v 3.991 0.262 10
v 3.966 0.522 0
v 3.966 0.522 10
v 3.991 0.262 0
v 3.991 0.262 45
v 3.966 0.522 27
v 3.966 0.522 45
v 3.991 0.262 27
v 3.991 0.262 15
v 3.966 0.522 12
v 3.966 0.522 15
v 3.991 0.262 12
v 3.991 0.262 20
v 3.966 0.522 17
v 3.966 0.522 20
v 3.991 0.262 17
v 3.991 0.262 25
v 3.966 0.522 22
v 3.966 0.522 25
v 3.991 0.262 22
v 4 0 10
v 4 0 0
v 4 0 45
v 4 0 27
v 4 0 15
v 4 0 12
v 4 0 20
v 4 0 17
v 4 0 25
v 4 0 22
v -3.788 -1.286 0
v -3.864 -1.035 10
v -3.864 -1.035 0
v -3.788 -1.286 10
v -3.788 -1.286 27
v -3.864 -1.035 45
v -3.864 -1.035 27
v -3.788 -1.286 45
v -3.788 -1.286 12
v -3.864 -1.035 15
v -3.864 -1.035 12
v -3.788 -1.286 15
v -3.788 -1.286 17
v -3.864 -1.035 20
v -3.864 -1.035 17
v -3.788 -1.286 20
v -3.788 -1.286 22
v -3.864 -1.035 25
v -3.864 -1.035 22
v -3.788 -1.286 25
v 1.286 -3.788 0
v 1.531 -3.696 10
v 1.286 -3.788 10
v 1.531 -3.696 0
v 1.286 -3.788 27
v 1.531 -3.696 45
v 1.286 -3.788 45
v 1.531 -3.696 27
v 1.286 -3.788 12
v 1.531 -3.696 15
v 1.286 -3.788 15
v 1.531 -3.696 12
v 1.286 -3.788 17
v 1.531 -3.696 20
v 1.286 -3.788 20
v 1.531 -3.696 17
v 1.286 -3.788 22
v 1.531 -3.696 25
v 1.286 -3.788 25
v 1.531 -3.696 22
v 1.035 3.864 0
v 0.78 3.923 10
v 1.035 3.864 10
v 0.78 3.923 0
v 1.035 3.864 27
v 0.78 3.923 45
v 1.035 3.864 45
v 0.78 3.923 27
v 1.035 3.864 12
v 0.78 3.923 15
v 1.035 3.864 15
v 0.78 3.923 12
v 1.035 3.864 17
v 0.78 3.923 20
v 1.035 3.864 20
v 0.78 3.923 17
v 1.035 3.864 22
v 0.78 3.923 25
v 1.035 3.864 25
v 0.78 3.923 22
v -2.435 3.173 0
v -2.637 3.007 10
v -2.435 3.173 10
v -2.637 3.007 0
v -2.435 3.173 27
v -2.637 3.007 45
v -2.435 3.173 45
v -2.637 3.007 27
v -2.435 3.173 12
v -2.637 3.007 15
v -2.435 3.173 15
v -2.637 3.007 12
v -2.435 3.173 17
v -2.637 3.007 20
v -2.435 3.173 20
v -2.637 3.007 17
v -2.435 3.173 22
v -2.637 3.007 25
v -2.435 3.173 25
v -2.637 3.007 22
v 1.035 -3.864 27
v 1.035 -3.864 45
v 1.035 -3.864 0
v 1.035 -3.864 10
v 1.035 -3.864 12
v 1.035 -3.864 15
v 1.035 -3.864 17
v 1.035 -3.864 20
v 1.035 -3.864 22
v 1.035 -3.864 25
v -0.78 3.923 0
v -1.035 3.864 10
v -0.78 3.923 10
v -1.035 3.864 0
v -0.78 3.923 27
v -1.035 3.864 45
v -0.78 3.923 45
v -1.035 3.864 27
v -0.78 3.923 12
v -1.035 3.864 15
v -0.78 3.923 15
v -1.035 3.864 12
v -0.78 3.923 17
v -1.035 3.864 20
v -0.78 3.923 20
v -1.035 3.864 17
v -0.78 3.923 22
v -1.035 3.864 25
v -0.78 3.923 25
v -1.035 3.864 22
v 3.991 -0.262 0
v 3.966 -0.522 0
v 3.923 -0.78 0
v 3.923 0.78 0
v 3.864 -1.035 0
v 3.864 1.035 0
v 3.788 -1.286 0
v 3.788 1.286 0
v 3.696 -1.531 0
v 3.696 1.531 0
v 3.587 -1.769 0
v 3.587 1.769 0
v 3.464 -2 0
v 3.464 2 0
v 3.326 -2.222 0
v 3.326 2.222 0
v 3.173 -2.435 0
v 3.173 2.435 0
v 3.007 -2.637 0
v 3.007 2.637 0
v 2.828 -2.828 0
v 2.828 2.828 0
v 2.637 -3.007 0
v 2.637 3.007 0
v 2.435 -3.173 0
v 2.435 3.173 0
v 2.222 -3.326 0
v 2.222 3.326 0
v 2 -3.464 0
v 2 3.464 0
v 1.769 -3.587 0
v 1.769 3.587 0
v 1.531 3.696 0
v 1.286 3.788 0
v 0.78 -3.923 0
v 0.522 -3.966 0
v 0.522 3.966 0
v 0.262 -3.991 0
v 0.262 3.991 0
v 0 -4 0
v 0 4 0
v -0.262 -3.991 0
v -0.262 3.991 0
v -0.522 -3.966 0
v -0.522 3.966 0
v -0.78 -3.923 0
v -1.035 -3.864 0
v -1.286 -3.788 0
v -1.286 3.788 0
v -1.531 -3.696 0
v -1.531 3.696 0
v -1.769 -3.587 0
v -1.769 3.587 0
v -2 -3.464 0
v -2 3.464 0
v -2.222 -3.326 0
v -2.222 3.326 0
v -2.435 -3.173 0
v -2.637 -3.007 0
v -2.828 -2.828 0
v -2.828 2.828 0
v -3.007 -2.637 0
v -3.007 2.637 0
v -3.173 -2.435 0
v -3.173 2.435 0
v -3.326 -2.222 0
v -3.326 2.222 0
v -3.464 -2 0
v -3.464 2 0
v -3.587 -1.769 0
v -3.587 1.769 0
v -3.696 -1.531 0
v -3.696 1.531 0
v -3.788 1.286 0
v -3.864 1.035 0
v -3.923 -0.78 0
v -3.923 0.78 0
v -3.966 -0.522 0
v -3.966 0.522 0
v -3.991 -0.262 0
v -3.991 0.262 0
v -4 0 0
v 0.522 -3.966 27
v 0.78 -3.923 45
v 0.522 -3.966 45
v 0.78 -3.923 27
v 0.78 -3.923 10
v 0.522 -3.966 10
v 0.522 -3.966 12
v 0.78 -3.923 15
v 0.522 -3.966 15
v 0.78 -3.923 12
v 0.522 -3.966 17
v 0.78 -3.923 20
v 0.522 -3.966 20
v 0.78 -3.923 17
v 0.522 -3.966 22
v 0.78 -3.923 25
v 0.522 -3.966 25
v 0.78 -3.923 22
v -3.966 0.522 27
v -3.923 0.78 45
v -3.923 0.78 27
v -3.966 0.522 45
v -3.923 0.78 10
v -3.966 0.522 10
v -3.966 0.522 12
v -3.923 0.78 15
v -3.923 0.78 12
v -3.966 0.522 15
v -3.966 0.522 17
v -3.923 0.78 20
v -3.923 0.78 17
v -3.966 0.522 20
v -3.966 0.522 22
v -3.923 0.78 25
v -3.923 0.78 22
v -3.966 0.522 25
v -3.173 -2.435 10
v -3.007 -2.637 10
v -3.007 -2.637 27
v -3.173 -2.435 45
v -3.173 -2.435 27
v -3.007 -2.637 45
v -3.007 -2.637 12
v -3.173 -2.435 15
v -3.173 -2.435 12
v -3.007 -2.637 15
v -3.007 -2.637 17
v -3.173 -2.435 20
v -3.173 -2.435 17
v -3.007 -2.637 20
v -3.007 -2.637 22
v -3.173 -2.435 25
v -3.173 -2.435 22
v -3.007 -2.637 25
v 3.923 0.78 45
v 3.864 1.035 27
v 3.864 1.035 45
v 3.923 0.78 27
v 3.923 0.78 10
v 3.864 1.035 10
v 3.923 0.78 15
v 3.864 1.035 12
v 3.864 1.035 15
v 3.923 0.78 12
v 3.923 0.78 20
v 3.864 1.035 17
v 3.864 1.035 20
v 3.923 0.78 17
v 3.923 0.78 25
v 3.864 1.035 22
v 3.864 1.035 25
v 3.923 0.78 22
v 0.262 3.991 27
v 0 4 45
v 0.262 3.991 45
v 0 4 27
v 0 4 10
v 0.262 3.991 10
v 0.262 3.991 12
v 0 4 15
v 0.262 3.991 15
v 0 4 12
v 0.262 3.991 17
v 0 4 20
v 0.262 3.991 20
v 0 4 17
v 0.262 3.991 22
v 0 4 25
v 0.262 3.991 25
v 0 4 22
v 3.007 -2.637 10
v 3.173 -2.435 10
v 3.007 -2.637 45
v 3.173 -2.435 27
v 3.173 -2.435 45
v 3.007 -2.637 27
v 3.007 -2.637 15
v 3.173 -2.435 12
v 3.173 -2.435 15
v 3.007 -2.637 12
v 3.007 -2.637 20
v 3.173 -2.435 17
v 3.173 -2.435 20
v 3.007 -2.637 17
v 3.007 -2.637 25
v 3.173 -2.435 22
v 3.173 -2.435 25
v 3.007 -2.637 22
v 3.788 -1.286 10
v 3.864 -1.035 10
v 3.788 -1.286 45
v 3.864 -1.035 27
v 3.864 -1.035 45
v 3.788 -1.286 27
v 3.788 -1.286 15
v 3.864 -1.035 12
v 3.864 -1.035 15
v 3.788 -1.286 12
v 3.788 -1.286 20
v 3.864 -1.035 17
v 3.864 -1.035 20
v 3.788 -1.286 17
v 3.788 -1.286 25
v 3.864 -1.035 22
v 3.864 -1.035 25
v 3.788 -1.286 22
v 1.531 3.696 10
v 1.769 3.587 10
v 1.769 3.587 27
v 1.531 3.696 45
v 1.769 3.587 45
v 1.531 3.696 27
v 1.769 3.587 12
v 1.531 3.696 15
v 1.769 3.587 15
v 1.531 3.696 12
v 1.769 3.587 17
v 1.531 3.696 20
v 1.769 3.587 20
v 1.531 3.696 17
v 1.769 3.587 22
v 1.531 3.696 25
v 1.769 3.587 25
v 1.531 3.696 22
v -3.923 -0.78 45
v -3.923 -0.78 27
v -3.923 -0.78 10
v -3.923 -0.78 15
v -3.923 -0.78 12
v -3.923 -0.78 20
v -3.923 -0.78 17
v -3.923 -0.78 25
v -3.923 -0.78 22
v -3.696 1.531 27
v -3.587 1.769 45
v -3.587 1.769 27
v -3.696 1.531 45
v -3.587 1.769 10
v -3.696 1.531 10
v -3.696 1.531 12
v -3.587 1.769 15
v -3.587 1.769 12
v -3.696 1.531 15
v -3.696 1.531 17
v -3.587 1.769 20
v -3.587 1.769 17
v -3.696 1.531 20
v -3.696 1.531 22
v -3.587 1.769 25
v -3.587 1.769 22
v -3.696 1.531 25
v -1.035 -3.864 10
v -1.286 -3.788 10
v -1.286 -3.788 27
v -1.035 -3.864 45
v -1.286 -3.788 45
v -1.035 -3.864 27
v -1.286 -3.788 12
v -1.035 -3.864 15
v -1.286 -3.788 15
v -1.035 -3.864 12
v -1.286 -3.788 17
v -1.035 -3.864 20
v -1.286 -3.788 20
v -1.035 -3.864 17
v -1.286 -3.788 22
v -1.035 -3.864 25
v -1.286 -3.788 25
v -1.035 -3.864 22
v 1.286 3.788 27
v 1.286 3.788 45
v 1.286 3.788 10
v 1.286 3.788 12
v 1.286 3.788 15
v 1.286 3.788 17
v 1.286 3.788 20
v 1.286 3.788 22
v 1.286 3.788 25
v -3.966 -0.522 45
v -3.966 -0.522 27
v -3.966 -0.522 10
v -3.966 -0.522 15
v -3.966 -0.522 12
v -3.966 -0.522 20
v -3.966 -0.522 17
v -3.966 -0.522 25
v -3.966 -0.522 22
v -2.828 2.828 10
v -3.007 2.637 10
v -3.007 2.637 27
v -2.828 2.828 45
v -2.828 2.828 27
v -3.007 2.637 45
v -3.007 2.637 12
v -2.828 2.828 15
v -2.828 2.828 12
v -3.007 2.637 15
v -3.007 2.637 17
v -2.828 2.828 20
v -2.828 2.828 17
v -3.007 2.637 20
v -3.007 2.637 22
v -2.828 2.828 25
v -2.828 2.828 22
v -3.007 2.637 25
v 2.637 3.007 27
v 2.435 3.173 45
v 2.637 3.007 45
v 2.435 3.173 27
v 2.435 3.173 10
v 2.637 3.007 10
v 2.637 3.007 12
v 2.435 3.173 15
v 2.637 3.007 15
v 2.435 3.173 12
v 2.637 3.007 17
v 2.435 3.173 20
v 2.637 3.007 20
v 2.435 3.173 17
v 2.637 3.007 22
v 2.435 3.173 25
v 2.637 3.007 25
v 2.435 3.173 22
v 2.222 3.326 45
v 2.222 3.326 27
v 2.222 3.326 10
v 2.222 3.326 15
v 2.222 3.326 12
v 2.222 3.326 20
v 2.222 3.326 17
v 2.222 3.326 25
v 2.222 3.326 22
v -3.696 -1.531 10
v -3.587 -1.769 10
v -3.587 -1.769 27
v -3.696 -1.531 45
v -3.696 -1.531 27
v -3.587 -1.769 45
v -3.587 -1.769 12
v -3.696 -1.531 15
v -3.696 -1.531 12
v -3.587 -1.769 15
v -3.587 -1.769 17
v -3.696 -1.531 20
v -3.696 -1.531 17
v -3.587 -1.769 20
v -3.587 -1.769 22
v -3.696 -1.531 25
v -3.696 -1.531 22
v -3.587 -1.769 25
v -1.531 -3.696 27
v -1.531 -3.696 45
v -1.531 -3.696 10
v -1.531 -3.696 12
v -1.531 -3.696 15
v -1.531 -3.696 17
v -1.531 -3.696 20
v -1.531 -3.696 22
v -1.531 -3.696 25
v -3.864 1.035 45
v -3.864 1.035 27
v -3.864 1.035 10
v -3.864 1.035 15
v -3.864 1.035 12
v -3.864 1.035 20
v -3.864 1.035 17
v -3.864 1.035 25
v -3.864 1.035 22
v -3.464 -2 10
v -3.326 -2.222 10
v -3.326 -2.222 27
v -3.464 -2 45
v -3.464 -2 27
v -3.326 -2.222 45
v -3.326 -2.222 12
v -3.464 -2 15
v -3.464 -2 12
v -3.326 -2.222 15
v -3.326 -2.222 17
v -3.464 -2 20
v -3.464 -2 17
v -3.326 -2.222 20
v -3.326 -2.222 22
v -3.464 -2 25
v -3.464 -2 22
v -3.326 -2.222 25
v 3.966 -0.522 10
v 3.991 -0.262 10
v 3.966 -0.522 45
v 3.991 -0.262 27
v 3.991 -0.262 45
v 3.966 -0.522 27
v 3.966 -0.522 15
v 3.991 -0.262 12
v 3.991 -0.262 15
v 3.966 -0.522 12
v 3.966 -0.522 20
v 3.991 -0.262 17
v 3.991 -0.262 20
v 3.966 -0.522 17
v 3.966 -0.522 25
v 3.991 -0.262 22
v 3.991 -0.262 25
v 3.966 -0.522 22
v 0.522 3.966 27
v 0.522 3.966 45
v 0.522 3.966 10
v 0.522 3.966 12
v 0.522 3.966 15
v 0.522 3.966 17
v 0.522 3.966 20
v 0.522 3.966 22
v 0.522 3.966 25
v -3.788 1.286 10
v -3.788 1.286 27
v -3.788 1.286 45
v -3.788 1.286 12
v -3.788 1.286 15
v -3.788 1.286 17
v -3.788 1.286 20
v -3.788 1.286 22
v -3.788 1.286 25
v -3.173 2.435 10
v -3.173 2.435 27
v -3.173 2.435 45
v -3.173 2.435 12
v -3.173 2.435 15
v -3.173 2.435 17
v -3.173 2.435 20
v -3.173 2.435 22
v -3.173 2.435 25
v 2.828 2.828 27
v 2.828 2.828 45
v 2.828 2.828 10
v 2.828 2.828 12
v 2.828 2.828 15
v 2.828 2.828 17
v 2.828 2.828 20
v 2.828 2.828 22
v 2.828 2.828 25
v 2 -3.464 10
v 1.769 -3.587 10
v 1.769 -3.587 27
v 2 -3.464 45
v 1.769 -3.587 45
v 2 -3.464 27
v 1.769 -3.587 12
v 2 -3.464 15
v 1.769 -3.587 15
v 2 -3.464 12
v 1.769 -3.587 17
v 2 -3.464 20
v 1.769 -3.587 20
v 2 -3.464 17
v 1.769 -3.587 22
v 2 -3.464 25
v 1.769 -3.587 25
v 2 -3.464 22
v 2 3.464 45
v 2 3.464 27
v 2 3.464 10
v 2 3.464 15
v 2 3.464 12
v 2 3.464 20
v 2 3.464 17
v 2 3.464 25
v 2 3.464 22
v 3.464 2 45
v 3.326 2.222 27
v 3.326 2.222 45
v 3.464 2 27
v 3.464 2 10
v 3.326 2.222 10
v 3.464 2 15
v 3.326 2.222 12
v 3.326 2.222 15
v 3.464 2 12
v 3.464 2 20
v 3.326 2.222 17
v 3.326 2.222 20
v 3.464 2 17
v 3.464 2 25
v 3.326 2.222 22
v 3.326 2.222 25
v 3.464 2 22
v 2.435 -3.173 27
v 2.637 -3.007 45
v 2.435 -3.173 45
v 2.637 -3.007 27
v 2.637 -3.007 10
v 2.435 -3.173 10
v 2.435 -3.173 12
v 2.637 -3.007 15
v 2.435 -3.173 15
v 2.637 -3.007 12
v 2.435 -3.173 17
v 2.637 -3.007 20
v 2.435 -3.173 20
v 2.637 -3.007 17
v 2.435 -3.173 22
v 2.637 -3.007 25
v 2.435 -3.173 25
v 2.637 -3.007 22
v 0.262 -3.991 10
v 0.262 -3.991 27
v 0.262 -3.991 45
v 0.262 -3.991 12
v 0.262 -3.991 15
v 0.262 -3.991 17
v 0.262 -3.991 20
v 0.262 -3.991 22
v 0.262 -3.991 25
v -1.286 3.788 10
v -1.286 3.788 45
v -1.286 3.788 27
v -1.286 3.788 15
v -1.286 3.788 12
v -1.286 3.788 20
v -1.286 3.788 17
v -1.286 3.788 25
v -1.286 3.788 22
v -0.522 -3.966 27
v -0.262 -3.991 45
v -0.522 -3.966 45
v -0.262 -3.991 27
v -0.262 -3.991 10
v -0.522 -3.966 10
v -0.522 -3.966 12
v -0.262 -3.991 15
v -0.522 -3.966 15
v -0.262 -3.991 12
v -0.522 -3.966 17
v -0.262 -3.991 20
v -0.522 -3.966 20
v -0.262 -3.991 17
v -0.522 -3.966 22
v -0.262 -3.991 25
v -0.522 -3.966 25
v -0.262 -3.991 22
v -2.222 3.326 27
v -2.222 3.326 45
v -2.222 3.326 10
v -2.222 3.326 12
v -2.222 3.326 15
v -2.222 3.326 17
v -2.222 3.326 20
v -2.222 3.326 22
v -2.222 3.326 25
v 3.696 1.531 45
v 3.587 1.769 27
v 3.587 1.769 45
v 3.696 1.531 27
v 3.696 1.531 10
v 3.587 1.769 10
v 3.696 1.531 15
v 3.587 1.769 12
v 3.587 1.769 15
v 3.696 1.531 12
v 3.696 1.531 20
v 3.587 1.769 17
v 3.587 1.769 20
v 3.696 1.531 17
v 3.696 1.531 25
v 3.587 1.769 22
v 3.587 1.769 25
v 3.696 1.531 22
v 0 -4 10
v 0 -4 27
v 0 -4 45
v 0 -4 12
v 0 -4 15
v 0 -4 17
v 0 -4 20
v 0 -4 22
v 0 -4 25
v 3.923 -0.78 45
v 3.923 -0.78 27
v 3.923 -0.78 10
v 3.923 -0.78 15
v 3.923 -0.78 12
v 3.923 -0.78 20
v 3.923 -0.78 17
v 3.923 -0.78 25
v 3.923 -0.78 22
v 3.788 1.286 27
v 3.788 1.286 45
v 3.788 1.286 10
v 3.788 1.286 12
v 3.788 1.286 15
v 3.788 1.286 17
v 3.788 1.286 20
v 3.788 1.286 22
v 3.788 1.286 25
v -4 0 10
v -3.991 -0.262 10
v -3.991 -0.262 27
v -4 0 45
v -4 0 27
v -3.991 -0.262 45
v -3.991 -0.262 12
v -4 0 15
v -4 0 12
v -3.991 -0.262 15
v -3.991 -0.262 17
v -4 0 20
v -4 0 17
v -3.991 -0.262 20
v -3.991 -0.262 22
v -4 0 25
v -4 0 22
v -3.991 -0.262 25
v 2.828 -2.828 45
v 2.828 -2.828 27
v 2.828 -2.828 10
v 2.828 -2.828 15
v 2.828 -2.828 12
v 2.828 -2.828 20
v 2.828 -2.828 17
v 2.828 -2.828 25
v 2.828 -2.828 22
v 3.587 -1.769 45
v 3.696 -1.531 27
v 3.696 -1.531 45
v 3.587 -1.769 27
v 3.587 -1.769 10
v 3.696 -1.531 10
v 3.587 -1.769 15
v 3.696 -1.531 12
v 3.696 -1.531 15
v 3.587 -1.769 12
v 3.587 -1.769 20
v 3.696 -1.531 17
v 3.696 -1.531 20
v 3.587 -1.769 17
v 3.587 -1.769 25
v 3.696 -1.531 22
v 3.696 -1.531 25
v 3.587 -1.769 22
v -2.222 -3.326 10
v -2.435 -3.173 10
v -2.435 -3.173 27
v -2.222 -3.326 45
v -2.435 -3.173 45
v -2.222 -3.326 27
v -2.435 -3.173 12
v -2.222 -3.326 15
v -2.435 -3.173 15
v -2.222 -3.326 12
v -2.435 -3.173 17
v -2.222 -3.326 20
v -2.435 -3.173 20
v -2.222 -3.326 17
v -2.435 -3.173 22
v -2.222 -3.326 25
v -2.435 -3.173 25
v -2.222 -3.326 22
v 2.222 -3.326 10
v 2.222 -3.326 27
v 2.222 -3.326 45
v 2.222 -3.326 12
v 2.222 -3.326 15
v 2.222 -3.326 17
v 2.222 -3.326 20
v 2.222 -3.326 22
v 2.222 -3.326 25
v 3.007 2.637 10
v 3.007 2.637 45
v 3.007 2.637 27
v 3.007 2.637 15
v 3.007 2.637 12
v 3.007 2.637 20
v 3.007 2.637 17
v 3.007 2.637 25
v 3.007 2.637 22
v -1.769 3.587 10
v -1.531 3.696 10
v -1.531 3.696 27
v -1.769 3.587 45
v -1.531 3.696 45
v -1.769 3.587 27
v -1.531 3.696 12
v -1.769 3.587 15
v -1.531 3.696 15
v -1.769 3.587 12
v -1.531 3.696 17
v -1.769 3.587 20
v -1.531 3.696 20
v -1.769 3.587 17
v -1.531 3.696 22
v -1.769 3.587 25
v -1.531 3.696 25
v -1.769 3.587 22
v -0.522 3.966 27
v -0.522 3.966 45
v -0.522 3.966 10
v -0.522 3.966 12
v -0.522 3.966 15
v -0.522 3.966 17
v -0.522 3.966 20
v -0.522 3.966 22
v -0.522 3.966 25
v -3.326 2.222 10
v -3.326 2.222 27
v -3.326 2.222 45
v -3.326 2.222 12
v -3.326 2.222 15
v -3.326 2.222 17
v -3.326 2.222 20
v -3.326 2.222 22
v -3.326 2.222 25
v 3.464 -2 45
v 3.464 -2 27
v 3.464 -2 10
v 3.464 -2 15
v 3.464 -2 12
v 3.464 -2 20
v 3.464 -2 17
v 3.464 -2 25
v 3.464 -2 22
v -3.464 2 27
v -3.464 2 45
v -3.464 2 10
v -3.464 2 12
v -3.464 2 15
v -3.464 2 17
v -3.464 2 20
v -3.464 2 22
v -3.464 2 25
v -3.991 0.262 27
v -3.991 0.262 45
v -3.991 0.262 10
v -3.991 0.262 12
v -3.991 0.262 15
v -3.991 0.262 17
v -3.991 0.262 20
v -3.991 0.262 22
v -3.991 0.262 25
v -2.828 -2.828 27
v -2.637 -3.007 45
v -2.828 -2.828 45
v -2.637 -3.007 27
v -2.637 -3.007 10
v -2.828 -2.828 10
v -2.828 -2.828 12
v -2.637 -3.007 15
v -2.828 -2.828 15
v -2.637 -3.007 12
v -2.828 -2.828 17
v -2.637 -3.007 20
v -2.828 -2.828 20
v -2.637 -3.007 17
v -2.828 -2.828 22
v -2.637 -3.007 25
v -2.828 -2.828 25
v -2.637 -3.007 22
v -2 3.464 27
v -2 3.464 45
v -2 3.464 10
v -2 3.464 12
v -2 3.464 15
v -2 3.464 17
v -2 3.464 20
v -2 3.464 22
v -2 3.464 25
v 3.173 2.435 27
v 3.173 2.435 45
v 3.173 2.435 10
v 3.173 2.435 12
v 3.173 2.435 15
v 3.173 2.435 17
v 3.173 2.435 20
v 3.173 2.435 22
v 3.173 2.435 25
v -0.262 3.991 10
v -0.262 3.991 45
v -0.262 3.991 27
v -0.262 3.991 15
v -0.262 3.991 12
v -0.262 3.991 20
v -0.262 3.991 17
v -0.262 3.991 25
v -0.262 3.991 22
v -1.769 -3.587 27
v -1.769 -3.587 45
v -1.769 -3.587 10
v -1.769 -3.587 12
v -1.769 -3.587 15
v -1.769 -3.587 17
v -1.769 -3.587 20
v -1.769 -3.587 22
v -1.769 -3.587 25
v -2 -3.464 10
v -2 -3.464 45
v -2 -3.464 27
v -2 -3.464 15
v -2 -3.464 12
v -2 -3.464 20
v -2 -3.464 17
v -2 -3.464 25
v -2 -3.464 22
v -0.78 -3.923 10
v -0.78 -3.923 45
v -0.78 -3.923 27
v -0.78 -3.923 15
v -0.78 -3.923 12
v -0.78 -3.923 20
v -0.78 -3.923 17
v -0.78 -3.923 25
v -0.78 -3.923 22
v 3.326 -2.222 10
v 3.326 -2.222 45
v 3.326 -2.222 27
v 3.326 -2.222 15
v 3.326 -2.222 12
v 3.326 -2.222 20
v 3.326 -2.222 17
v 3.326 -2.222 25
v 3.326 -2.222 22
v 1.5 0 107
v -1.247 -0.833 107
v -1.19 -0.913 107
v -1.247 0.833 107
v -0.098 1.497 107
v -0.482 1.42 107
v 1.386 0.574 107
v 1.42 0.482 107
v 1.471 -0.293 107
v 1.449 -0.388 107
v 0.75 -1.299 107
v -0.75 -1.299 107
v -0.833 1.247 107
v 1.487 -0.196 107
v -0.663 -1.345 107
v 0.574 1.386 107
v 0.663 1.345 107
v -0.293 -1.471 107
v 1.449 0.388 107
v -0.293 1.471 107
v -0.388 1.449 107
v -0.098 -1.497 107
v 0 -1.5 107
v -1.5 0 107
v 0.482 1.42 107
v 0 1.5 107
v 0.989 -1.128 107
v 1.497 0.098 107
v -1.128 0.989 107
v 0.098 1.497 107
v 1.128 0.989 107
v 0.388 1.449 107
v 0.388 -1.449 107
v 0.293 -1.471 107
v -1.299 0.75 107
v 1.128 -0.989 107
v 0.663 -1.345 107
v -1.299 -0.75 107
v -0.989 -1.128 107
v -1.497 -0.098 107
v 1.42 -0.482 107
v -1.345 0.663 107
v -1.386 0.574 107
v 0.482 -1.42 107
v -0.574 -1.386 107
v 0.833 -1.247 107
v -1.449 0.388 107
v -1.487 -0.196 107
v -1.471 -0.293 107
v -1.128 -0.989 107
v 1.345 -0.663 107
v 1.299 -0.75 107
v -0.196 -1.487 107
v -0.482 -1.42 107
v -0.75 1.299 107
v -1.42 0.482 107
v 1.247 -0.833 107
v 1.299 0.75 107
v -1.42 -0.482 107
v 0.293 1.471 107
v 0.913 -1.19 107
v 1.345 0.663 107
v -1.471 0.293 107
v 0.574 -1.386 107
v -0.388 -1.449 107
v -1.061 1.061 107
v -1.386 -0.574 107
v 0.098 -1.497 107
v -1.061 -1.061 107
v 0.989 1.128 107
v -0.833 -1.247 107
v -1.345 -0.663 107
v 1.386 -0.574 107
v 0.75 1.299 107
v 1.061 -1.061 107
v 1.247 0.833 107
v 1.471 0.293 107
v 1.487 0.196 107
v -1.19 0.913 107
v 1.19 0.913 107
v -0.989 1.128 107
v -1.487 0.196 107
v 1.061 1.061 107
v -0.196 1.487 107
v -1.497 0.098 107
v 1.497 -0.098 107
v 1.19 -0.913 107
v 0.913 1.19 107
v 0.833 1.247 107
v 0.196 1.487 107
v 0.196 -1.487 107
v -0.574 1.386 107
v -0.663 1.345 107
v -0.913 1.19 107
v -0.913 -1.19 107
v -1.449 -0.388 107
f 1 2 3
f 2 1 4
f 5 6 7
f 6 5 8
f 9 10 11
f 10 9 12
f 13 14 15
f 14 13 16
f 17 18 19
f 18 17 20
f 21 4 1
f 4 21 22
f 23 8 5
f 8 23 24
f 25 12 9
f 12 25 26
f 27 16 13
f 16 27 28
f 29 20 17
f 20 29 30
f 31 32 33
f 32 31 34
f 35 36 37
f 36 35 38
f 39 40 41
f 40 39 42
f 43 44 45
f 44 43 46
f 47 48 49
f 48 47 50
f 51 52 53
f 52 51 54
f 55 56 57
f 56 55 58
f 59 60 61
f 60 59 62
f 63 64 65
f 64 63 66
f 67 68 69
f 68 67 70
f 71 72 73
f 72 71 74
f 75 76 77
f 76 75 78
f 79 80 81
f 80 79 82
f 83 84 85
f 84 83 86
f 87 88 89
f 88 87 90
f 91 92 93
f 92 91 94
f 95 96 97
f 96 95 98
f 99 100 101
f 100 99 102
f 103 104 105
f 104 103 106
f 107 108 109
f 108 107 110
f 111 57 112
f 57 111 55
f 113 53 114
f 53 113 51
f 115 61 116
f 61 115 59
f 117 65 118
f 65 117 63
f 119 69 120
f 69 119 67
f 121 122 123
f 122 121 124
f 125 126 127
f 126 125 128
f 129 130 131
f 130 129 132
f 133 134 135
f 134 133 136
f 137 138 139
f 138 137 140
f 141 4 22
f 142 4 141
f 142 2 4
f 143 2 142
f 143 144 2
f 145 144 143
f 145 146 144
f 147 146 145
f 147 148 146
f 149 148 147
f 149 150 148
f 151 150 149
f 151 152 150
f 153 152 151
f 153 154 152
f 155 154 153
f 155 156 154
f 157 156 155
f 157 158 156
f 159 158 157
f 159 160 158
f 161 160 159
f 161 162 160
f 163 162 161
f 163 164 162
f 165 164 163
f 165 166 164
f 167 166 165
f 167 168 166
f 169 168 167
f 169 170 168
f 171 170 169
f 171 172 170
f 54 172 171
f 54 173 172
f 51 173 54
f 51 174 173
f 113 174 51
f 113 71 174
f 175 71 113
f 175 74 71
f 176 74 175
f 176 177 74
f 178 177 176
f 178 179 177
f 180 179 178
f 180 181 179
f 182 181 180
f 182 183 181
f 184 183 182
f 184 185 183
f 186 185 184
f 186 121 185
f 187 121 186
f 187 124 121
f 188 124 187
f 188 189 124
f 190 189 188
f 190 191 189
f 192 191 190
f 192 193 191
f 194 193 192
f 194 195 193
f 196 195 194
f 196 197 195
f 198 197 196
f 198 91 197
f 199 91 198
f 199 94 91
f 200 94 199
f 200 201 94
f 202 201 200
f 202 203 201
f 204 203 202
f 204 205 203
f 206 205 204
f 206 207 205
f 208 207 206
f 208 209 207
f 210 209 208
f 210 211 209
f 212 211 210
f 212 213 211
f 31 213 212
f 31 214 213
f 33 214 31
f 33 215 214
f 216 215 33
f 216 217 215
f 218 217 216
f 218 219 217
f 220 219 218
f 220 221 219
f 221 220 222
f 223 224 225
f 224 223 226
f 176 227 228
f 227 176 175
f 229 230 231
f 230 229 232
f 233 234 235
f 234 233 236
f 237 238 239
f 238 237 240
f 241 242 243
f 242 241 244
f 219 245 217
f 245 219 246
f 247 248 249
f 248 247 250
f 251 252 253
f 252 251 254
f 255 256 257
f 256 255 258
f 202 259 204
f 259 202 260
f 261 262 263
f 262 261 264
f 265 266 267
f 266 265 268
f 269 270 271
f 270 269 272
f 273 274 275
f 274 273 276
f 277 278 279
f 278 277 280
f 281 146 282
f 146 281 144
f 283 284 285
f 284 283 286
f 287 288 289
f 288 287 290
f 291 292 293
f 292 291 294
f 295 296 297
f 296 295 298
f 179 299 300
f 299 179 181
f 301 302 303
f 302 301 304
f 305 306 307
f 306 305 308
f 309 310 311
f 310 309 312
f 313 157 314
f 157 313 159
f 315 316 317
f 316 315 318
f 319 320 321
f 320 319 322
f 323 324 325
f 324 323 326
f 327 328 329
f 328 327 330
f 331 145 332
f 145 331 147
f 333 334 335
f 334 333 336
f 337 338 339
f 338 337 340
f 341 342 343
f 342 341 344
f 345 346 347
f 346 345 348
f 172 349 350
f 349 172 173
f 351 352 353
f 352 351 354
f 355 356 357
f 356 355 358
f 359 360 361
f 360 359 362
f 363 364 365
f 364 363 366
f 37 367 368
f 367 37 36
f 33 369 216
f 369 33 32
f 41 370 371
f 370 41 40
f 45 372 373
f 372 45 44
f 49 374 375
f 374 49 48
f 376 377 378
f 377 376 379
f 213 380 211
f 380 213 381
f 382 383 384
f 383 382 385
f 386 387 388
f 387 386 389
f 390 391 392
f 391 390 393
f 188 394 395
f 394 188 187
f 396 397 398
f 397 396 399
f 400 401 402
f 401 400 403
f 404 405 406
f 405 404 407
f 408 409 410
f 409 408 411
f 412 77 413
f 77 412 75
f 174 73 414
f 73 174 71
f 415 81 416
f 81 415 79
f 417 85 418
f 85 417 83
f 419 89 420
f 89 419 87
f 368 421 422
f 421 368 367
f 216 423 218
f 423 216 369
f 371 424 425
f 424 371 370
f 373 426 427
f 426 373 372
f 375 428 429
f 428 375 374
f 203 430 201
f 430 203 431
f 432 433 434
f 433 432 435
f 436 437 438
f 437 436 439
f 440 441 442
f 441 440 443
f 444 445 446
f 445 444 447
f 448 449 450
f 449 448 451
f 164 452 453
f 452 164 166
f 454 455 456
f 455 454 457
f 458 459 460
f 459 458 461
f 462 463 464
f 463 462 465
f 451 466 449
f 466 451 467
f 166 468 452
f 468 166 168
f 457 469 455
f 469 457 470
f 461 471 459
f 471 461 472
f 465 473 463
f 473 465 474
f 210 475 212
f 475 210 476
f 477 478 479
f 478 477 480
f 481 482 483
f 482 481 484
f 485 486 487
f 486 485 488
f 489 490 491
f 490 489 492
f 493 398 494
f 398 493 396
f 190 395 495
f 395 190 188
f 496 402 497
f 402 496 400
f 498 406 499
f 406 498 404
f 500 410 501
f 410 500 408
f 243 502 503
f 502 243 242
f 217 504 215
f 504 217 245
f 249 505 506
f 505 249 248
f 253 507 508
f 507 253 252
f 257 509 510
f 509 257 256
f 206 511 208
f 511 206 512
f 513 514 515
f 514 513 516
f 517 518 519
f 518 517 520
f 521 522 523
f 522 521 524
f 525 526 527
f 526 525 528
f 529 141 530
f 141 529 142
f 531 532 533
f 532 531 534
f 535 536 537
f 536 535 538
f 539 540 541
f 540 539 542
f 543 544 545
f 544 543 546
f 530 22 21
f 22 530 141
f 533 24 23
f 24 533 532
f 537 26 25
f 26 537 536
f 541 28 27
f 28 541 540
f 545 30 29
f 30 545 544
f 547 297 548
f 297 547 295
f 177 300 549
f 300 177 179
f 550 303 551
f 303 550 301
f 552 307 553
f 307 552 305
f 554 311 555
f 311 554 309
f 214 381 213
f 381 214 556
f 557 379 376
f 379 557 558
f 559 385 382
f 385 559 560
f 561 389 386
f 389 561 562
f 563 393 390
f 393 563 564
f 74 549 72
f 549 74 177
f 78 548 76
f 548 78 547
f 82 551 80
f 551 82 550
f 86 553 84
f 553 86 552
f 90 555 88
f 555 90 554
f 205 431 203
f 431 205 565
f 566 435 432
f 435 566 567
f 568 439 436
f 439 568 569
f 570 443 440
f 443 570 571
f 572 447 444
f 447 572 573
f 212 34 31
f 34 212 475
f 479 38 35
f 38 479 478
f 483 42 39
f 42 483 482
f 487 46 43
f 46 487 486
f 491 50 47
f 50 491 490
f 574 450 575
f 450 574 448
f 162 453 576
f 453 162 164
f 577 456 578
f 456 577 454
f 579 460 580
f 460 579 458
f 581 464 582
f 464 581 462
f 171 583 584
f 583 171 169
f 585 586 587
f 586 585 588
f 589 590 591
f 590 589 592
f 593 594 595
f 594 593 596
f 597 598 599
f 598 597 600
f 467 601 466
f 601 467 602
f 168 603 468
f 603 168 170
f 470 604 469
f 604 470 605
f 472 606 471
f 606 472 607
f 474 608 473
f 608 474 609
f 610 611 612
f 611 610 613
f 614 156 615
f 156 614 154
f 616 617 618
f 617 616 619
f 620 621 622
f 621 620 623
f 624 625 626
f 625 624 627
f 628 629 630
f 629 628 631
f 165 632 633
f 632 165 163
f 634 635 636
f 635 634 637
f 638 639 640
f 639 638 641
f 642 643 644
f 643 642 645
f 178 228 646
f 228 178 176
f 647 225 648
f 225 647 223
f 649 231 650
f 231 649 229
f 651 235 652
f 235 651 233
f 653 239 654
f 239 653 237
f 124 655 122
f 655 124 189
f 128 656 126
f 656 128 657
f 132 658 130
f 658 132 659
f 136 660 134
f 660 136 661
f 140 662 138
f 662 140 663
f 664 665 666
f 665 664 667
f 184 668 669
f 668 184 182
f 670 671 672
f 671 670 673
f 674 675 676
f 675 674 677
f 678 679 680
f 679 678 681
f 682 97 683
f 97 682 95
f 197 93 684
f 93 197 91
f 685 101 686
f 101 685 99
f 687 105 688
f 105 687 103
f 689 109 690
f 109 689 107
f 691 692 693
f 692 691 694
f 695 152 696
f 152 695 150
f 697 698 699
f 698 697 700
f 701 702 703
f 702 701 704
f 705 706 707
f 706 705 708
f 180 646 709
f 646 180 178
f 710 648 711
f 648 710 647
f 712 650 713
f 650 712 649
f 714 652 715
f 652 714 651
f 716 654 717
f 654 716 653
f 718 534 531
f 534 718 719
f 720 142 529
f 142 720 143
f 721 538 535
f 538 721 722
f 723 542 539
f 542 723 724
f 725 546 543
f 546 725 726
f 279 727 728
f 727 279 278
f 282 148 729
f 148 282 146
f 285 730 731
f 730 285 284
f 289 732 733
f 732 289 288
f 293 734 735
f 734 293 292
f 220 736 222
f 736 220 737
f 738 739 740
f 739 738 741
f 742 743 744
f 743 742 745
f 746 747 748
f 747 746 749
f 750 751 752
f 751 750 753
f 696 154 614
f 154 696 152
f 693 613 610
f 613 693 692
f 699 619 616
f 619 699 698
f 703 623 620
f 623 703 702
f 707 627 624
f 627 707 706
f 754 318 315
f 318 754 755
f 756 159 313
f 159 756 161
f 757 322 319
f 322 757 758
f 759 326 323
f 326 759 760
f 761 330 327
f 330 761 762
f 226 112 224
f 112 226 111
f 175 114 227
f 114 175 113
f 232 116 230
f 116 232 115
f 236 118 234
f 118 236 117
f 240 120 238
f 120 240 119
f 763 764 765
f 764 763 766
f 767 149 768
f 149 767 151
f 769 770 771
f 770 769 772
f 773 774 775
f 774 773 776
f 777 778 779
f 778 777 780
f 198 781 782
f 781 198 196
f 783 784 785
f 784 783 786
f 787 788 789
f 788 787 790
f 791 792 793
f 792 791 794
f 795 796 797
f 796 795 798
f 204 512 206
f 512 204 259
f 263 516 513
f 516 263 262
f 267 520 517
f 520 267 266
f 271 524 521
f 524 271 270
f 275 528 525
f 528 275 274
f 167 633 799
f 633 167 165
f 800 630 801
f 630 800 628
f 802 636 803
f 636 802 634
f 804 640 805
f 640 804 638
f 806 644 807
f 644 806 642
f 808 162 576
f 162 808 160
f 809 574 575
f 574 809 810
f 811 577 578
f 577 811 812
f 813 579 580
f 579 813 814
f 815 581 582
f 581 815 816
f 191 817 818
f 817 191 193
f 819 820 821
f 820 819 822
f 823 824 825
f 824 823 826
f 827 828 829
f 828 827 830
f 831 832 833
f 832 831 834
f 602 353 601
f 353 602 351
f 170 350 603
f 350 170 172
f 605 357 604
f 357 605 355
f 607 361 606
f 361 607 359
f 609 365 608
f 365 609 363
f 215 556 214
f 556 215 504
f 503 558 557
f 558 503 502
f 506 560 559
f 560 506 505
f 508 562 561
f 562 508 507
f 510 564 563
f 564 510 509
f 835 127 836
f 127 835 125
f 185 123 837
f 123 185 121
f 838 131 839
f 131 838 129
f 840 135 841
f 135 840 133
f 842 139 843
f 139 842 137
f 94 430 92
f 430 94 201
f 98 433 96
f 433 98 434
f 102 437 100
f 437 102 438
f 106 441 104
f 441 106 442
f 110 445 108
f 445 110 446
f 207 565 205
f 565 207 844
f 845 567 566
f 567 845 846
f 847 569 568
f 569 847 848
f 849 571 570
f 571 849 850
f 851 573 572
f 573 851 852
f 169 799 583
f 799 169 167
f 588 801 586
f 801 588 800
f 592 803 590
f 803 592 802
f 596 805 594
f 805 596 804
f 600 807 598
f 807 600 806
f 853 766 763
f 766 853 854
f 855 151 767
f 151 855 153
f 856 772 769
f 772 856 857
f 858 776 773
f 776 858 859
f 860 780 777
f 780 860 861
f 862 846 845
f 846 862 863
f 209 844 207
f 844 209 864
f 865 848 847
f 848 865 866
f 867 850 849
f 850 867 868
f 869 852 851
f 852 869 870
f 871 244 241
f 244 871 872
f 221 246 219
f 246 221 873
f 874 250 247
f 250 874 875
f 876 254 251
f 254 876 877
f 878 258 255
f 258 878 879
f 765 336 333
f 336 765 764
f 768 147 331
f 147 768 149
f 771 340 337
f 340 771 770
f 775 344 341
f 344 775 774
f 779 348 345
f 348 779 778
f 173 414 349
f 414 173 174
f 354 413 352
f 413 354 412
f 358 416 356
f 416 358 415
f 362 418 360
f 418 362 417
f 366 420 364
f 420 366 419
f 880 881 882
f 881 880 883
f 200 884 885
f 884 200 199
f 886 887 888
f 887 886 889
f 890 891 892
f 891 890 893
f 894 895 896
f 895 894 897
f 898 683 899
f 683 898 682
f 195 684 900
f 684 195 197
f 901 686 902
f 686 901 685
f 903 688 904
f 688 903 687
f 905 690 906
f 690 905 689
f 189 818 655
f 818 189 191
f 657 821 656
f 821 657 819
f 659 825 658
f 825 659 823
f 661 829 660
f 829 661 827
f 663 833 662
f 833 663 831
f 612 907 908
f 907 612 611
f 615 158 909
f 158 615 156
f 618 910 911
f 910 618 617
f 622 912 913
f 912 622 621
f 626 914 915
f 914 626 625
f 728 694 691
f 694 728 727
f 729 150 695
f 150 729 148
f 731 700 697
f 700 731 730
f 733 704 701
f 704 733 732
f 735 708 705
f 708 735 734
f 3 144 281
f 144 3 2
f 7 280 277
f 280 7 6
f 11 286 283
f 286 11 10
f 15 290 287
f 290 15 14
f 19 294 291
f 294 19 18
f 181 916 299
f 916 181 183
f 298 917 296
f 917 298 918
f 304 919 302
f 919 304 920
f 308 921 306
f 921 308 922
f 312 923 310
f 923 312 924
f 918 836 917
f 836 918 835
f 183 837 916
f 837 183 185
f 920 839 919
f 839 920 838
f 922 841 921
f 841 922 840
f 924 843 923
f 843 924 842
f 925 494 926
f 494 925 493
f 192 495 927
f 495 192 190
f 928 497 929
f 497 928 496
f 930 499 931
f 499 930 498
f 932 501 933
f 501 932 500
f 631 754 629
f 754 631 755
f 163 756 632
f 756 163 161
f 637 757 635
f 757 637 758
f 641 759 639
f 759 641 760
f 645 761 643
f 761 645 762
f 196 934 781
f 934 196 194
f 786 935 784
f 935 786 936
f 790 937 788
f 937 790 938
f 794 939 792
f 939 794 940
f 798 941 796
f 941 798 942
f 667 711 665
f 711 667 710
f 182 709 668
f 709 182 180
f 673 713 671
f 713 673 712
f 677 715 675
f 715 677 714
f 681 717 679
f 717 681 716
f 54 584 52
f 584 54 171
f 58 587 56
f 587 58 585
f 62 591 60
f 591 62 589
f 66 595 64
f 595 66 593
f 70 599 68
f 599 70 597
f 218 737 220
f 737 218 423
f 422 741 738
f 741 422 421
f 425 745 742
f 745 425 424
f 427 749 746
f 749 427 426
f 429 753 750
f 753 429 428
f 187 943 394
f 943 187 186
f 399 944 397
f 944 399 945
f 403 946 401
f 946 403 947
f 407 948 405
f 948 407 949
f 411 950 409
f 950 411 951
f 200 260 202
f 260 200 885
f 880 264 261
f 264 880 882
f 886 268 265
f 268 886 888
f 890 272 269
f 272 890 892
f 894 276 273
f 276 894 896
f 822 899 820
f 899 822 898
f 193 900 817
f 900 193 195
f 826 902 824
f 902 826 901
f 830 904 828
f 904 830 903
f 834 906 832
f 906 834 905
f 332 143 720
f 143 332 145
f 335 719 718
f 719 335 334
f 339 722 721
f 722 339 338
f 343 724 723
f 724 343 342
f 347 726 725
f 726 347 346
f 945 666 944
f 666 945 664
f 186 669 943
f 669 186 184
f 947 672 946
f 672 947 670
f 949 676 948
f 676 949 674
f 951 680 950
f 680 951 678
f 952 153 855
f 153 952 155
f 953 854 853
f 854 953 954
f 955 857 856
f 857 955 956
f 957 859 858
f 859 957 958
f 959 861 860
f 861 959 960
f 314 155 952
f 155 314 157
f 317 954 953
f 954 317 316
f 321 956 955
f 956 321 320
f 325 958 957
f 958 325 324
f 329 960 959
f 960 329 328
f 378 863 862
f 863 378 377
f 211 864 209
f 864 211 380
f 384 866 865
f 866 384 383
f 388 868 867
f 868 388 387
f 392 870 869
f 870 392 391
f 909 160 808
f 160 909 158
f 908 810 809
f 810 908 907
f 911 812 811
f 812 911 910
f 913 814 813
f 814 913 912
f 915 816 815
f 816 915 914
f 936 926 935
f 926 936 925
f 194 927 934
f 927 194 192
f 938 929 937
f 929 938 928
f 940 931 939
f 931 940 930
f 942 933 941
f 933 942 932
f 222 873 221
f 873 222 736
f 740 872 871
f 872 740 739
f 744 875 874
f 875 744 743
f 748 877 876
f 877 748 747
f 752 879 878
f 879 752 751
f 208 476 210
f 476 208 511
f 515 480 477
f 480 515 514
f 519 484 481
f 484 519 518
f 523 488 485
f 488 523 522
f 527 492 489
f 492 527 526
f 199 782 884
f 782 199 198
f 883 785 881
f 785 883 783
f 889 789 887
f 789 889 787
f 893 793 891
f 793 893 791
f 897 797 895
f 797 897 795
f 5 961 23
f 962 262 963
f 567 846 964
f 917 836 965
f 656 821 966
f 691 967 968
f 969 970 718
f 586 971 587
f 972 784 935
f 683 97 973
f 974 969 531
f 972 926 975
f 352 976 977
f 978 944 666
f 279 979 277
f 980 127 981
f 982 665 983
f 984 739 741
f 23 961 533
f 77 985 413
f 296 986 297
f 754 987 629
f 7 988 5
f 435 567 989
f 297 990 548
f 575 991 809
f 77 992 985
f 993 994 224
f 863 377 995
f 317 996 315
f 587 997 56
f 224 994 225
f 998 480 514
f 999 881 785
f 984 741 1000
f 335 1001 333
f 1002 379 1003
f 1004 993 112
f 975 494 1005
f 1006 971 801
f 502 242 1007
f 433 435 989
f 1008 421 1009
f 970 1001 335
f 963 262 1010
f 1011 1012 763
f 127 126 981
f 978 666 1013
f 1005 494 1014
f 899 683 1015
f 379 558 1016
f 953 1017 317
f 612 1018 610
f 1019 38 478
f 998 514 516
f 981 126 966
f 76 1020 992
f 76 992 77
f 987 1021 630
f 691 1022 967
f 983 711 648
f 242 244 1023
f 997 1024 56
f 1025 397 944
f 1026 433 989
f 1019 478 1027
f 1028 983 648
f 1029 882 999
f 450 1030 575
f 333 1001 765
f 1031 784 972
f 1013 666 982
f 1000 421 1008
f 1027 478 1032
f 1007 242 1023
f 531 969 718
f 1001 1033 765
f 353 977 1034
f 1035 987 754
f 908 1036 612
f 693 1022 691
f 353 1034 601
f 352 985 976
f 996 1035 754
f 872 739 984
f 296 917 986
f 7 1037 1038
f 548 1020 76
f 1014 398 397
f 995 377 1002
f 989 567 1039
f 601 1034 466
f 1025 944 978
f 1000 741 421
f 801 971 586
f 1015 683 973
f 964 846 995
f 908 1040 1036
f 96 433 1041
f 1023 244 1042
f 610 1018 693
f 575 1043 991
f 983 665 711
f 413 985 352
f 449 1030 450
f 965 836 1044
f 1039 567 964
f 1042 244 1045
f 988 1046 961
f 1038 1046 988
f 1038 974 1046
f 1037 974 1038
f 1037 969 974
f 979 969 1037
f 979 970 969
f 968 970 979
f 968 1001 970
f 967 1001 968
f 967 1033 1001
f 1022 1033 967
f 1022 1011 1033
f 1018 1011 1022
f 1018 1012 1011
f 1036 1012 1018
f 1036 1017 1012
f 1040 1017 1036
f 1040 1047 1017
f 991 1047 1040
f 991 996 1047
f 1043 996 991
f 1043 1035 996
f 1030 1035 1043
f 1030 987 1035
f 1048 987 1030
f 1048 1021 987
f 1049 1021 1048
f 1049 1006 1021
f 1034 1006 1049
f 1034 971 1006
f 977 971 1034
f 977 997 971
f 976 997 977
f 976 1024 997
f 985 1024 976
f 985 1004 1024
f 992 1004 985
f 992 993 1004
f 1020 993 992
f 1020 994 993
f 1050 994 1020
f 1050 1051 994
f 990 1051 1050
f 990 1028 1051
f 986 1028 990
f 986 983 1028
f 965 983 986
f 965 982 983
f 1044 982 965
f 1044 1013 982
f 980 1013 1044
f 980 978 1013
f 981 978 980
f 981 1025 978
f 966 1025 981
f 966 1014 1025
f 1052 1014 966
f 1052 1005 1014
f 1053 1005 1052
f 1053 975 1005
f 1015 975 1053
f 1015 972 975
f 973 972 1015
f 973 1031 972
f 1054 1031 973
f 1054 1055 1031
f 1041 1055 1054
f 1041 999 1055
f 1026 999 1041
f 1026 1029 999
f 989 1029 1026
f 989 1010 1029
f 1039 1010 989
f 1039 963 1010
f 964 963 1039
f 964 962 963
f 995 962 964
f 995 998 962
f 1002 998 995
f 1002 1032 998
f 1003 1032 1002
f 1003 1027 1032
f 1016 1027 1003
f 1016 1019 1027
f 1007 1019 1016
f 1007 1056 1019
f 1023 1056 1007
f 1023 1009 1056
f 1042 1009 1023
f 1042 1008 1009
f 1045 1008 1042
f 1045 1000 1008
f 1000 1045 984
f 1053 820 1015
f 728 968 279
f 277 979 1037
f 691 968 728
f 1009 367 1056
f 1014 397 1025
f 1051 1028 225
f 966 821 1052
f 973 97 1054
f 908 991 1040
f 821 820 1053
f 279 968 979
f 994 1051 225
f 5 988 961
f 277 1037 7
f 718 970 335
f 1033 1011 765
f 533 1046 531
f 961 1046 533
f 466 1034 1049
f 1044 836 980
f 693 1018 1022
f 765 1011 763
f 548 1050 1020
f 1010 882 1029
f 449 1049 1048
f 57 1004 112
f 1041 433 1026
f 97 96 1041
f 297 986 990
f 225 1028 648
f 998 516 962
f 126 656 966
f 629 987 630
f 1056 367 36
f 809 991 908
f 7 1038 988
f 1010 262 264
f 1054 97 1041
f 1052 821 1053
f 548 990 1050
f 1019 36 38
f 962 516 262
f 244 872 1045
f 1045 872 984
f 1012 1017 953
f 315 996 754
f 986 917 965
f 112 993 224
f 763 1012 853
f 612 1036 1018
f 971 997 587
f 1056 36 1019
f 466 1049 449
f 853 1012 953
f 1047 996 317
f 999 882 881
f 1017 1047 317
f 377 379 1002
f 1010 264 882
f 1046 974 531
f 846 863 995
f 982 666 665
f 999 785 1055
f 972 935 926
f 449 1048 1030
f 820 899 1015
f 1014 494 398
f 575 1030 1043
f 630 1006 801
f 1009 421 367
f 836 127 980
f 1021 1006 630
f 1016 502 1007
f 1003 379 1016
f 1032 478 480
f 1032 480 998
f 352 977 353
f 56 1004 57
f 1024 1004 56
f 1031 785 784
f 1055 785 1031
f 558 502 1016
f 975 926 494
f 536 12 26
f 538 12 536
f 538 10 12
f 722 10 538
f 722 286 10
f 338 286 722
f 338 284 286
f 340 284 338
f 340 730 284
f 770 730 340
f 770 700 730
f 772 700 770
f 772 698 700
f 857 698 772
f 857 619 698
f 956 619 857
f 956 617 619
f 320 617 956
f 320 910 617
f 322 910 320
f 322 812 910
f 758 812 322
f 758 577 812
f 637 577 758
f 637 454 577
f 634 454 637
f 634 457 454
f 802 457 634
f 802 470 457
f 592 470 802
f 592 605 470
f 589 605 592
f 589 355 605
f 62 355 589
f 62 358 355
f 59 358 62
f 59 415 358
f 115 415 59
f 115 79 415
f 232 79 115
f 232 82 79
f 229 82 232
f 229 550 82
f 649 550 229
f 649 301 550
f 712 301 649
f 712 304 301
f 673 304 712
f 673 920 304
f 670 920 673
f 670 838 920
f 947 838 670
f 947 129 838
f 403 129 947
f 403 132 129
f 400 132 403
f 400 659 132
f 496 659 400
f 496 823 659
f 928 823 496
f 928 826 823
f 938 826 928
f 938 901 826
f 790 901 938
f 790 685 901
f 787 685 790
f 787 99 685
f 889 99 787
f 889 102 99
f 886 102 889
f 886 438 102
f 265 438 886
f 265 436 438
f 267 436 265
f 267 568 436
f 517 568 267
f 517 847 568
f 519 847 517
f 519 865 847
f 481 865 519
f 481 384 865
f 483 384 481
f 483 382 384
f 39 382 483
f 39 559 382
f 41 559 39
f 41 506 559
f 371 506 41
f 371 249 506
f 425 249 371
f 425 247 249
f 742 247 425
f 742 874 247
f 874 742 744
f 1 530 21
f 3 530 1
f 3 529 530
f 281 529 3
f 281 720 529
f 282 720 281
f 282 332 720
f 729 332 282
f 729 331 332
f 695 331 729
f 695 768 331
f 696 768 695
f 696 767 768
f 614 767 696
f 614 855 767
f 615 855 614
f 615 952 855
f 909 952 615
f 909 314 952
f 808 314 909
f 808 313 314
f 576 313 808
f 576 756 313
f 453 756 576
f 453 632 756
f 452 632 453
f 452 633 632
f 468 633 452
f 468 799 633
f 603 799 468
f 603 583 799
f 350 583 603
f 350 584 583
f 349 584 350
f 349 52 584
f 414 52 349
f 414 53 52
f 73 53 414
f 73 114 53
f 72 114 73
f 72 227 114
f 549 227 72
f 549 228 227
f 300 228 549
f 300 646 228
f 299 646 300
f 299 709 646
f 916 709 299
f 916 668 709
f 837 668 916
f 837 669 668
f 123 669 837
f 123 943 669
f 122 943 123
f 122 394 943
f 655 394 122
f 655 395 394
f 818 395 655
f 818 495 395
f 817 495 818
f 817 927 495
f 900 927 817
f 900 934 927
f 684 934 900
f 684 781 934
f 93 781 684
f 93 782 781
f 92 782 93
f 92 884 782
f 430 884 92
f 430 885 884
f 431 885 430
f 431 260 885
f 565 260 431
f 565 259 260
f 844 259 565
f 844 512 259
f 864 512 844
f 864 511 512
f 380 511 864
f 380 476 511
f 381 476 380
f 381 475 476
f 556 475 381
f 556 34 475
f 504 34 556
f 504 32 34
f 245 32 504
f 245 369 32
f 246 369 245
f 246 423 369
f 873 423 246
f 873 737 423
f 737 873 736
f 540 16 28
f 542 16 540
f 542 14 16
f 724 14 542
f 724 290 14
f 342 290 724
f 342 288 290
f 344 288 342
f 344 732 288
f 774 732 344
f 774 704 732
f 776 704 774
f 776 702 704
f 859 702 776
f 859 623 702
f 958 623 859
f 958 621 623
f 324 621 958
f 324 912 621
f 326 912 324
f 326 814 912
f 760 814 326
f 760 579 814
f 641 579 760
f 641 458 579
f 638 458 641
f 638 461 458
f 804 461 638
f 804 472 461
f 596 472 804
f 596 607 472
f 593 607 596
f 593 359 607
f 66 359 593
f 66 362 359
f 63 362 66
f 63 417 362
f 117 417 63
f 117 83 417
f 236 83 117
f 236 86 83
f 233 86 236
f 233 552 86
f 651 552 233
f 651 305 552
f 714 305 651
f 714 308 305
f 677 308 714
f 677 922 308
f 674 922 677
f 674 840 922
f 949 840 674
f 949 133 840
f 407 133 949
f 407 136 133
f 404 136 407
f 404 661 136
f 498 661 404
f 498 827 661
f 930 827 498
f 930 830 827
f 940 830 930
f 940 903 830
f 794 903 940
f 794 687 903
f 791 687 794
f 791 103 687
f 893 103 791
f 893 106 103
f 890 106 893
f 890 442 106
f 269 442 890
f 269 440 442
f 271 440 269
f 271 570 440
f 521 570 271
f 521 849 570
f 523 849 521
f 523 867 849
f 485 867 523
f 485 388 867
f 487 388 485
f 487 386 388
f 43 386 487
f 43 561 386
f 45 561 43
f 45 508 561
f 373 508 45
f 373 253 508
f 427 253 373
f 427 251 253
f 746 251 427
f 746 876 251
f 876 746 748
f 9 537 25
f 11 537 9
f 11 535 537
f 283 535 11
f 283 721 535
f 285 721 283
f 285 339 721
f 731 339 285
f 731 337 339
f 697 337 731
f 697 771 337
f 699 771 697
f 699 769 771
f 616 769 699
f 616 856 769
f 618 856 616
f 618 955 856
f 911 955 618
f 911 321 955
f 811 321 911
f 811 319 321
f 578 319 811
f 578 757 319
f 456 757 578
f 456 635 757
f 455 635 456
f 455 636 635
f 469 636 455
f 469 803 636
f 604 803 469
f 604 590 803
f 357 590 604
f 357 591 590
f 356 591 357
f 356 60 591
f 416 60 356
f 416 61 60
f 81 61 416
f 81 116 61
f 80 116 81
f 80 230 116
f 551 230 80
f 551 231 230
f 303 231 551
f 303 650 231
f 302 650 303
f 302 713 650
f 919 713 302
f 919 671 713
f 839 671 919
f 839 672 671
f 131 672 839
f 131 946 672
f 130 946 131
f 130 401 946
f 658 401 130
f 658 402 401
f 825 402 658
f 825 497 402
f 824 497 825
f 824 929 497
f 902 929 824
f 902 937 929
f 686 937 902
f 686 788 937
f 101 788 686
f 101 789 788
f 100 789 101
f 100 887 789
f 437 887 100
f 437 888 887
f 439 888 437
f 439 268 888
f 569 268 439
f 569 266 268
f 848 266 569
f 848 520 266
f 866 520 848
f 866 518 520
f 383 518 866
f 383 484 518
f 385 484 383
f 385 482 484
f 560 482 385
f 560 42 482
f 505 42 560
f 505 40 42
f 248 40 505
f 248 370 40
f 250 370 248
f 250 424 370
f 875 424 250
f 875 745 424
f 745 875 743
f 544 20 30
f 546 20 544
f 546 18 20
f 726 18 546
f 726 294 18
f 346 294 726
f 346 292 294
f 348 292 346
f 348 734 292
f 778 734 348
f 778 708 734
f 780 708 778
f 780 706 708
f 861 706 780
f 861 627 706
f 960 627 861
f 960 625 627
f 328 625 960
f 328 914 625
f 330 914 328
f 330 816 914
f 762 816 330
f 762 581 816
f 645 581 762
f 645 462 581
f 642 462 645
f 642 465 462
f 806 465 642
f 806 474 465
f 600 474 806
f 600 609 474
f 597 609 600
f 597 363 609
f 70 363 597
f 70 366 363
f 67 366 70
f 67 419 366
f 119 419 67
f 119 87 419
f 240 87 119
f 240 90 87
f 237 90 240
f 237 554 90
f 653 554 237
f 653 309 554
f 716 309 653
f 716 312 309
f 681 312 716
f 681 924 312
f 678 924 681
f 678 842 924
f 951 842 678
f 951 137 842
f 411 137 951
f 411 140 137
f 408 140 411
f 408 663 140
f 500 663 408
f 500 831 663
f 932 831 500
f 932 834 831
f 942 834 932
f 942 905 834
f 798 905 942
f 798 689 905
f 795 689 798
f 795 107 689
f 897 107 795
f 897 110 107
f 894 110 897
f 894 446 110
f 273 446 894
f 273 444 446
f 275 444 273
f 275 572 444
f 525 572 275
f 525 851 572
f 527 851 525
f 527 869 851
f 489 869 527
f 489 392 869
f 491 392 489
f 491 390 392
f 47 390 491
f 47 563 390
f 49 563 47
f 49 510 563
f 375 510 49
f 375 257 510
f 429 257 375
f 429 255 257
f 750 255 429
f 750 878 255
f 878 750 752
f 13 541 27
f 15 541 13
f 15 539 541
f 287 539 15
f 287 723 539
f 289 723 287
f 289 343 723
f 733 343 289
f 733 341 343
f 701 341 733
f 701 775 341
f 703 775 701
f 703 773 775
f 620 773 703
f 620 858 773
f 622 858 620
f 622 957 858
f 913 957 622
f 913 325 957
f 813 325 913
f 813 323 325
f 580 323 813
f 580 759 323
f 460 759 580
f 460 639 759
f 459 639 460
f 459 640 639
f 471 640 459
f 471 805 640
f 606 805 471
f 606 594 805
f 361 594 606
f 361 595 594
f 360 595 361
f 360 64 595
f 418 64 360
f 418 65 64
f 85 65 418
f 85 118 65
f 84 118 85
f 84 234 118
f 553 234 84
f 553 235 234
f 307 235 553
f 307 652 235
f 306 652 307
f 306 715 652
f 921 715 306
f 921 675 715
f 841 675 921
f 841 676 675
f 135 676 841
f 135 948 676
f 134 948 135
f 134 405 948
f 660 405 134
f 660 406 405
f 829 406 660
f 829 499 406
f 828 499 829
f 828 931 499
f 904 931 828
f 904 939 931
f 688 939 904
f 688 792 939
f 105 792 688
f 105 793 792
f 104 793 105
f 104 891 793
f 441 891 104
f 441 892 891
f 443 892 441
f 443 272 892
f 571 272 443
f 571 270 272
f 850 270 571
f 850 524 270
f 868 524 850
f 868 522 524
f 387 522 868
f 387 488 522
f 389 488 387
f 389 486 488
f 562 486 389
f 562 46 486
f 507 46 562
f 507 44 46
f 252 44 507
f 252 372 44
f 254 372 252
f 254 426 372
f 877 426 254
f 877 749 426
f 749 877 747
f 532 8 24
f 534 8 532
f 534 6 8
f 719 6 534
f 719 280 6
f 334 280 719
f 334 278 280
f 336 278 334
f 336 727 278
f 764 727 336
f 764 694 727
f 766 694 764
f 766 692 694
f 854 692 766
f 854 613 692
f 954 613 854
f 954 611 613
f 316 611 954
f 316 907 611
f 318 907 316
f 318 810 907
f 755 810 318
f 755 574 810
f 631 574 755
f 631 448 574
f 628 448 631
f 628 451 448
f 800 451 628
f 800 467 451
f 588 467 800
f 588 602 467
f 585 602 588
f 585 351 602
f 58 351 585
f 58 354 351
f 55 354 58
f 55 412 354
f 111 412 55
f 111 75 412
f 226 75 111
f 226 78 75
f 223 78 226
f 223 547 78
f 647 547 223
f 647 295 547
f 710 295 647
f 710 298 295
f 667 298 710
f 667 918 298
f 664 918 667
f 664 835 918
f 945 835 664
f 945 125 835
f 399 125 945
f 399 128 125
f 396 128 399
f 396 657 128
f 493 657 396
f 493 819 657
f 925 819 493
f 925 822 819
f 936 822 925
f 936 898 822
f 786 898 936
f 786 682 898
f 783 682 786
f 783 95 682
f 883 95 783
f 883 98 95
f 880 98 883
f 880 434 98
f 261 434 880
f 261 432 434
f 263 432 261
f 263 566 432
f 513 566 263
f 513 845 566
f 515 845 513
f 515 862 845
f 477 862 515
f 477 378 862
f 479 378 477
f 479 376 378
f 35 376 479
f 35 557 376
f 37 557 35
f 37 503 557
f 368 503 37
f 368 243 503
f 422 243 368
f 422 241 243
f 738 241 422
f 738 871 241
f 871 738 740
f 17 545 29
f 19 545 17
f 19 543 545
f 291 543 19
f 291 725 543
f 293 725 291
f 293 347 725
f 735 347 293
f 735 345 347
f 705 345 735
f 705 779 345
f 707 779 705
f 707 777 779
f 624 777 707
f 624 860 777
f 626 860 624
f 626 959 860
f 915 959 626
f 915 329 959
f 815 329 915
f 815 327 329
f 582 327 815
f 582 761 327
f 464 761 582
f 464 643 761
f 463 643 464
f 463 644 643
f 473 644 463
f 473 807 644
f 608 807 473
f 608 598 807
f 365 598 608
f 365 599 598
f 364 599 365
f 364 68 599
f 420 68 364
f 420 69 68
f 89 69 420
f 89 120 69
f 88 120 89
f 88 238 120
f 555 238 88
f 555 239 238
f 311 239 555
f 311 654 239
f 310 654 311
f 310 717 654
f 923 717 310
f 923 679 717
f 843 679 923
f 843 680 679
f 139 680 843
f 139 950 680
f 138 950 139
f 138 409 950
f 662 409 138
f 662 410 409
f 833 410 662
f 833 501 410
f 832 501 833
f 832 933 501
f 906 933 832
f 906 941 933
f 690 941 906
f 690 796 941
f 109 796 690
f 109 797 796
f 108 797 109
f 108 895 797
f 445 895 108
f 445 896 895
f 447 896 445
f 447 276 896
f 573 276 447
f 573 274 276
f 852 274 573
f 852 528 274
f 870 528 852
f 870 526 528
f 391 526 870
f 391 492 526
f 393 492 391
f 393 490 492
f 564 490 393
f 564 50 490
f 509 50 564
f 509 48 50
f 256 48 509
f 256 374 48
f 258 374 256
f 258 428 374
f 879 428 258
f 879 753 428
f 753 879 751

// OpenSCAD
// Pestle for grinding tissue inside a 1.5 mL microcentrifuge tube
// Print orientation: standing upright, handle at the bottom

// ---- Dimensions (mm) ----
handle_d        = 8;     // handle diameter
handle_top_z    = 45;    // top of handle / start of cone
cone_top_d      = 3;     // cone diameter at tip
sphere_d        = 3;     // tip sphere diameter
groove_w        = 2;     // groove width (Z)
groove_depth    = 1;     // groove depth (radial)
groove_centres  = [10, 15, 20, 25]; // groove centre heights
eps             = 0.5;   // cutter overshoot past faces

$fn = 96;

// ---- Model ----
difference() {
    union() {
        // Handle
        cylinder(d = handle_d, h = handle_top_z);
        // Cone (8 mm -> 3 mm over 45..62 mm)
        translate([0, 0, handle_top_z])
            cylinder(d1 = handle_d, d2 = cone_top_d, h = handle_top_z + 17);
        // Rounded tip: 3 mm sphere centred at z = 62
        translate([0, 0, handle_top_z + 17])
            sphere(d = sphere_d);
    }

    // Grip grooves, cut fully through the handle
    for (z = groove_centres)
        translate([0, 0, z])
            cylinder(d = handle_d + 2 * eps, h = groove_w, depth = groove_depth + eps);
}
